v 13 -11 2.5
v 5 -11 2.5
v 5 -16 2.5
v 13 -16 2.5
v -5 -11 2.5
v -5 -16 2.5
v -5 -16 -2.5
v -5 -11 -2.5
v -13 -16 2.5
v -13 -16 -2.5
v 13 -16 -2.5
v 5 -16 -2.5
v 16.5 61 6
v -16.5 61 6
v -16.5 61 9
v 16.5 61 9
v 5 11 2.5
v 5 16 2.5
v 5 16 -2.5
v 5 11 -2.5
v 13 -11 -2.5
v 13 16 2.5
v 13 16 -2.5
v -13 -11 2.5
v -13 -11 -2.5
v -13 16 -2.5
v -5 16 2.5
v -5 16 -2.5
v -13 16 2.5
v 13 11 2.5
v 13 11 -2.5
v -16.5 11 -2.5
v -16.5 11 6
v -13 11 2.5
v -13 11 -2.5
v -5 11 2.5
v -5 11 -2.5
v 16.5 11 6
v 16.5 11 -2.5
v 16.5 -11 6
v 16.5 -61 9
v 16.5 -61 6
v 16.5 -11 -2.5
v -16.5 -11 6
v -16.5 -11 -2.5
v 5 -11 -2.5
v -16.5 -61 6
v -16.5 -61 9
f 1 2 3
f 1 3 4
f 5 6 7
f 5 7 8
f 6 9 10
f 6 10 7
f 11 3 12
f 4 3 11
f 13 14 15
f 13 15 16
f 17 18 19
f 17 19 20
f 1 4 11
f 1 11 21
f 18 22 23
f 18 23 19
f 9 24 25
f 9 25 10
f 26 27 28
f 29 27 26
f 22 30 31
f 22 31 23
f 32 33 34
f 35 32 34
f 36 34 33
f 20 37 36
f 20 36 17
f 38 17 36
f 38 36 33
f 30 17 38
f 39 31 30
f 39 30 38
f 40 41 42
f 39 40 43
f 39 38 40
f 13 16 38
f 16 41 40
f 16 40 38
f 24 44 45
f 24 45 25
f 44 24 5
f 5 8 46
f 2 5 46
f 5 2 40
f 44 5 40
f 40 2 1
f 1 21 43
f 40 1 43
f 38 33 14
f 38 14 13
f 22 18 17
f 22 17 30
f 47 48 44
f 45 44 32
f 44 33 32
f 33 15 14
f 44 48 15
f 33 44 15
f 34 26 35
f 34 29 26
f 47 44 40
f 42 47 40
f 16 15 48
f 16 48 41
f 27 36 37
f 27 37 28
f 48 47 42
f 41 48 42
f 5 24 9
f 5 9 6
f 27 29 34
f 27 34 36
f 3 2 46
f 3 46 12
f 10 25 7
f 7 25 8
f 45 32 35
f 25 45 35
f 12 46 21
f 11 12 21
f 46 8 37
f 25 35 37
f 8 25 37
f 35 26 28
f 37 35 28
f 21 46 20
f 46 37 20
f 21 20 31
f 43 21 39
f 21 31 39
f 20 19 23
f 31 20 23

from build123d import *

# Parameters (mm, degrees)
BOSS_EXTRUDE1_DEPTH = 2.5
SKETCH_1_W          = 33
SKETCH_1_H          = 22
EXTRUDE_1_DEPTH     = 6.5
SKETCH_2_W          = 33
SKETCH_2_H          = 3
EXTRUDE_2_DEPTH     = 50


with BuildPart() as part:
    # Sketch1 → Boss-Extrude1 (new, symmetric)
    with BuildSketch(Plane.XY):
        Polygon((-13, 11), (-16.5, 11), (-16.5, -11), (-13, -11), (-13, -16), (-5, -16), (-5, -11), (5, -11), (5, -16), (13, -16), (13, -11), (16.5, -11), (16.5, 11), (13, 11), (13, 16), (5, 16), (5, 11), (-5, 11), (-5, 16), (-13, 16), align=None)
    extrude(amount=BOSS_EXTRUDE1_DEPTH, both=True)

    # 草图1 → 凸台-拉伸1 (add)
    with BuildSketch(Plane.XY.offset(2.5)):
        Rectangle(SKETCH_1_W, SKETCH_1_H)
    extrude(amount=EXTRUDE_1_DEPTH)

    # 草图2 → 凸台-拉伸2 (add)
    with BuildSketch(Plane(origin=(0, 11, 0), x_dir=(1, 0, 0), z_dir=(0, 1, 0))):
        with Locations((0, -7.5)):
            Rectangle(SKETCH_2_W, SKETCH_2_H)
    extrude_2 = extrude(amount=EXTRUDE_2_DEPTH)

    # 镜向1: 凸台-拉伸2 across plane
    add(extrude_2.mirror(Plane.ZX))


solid = part.part
